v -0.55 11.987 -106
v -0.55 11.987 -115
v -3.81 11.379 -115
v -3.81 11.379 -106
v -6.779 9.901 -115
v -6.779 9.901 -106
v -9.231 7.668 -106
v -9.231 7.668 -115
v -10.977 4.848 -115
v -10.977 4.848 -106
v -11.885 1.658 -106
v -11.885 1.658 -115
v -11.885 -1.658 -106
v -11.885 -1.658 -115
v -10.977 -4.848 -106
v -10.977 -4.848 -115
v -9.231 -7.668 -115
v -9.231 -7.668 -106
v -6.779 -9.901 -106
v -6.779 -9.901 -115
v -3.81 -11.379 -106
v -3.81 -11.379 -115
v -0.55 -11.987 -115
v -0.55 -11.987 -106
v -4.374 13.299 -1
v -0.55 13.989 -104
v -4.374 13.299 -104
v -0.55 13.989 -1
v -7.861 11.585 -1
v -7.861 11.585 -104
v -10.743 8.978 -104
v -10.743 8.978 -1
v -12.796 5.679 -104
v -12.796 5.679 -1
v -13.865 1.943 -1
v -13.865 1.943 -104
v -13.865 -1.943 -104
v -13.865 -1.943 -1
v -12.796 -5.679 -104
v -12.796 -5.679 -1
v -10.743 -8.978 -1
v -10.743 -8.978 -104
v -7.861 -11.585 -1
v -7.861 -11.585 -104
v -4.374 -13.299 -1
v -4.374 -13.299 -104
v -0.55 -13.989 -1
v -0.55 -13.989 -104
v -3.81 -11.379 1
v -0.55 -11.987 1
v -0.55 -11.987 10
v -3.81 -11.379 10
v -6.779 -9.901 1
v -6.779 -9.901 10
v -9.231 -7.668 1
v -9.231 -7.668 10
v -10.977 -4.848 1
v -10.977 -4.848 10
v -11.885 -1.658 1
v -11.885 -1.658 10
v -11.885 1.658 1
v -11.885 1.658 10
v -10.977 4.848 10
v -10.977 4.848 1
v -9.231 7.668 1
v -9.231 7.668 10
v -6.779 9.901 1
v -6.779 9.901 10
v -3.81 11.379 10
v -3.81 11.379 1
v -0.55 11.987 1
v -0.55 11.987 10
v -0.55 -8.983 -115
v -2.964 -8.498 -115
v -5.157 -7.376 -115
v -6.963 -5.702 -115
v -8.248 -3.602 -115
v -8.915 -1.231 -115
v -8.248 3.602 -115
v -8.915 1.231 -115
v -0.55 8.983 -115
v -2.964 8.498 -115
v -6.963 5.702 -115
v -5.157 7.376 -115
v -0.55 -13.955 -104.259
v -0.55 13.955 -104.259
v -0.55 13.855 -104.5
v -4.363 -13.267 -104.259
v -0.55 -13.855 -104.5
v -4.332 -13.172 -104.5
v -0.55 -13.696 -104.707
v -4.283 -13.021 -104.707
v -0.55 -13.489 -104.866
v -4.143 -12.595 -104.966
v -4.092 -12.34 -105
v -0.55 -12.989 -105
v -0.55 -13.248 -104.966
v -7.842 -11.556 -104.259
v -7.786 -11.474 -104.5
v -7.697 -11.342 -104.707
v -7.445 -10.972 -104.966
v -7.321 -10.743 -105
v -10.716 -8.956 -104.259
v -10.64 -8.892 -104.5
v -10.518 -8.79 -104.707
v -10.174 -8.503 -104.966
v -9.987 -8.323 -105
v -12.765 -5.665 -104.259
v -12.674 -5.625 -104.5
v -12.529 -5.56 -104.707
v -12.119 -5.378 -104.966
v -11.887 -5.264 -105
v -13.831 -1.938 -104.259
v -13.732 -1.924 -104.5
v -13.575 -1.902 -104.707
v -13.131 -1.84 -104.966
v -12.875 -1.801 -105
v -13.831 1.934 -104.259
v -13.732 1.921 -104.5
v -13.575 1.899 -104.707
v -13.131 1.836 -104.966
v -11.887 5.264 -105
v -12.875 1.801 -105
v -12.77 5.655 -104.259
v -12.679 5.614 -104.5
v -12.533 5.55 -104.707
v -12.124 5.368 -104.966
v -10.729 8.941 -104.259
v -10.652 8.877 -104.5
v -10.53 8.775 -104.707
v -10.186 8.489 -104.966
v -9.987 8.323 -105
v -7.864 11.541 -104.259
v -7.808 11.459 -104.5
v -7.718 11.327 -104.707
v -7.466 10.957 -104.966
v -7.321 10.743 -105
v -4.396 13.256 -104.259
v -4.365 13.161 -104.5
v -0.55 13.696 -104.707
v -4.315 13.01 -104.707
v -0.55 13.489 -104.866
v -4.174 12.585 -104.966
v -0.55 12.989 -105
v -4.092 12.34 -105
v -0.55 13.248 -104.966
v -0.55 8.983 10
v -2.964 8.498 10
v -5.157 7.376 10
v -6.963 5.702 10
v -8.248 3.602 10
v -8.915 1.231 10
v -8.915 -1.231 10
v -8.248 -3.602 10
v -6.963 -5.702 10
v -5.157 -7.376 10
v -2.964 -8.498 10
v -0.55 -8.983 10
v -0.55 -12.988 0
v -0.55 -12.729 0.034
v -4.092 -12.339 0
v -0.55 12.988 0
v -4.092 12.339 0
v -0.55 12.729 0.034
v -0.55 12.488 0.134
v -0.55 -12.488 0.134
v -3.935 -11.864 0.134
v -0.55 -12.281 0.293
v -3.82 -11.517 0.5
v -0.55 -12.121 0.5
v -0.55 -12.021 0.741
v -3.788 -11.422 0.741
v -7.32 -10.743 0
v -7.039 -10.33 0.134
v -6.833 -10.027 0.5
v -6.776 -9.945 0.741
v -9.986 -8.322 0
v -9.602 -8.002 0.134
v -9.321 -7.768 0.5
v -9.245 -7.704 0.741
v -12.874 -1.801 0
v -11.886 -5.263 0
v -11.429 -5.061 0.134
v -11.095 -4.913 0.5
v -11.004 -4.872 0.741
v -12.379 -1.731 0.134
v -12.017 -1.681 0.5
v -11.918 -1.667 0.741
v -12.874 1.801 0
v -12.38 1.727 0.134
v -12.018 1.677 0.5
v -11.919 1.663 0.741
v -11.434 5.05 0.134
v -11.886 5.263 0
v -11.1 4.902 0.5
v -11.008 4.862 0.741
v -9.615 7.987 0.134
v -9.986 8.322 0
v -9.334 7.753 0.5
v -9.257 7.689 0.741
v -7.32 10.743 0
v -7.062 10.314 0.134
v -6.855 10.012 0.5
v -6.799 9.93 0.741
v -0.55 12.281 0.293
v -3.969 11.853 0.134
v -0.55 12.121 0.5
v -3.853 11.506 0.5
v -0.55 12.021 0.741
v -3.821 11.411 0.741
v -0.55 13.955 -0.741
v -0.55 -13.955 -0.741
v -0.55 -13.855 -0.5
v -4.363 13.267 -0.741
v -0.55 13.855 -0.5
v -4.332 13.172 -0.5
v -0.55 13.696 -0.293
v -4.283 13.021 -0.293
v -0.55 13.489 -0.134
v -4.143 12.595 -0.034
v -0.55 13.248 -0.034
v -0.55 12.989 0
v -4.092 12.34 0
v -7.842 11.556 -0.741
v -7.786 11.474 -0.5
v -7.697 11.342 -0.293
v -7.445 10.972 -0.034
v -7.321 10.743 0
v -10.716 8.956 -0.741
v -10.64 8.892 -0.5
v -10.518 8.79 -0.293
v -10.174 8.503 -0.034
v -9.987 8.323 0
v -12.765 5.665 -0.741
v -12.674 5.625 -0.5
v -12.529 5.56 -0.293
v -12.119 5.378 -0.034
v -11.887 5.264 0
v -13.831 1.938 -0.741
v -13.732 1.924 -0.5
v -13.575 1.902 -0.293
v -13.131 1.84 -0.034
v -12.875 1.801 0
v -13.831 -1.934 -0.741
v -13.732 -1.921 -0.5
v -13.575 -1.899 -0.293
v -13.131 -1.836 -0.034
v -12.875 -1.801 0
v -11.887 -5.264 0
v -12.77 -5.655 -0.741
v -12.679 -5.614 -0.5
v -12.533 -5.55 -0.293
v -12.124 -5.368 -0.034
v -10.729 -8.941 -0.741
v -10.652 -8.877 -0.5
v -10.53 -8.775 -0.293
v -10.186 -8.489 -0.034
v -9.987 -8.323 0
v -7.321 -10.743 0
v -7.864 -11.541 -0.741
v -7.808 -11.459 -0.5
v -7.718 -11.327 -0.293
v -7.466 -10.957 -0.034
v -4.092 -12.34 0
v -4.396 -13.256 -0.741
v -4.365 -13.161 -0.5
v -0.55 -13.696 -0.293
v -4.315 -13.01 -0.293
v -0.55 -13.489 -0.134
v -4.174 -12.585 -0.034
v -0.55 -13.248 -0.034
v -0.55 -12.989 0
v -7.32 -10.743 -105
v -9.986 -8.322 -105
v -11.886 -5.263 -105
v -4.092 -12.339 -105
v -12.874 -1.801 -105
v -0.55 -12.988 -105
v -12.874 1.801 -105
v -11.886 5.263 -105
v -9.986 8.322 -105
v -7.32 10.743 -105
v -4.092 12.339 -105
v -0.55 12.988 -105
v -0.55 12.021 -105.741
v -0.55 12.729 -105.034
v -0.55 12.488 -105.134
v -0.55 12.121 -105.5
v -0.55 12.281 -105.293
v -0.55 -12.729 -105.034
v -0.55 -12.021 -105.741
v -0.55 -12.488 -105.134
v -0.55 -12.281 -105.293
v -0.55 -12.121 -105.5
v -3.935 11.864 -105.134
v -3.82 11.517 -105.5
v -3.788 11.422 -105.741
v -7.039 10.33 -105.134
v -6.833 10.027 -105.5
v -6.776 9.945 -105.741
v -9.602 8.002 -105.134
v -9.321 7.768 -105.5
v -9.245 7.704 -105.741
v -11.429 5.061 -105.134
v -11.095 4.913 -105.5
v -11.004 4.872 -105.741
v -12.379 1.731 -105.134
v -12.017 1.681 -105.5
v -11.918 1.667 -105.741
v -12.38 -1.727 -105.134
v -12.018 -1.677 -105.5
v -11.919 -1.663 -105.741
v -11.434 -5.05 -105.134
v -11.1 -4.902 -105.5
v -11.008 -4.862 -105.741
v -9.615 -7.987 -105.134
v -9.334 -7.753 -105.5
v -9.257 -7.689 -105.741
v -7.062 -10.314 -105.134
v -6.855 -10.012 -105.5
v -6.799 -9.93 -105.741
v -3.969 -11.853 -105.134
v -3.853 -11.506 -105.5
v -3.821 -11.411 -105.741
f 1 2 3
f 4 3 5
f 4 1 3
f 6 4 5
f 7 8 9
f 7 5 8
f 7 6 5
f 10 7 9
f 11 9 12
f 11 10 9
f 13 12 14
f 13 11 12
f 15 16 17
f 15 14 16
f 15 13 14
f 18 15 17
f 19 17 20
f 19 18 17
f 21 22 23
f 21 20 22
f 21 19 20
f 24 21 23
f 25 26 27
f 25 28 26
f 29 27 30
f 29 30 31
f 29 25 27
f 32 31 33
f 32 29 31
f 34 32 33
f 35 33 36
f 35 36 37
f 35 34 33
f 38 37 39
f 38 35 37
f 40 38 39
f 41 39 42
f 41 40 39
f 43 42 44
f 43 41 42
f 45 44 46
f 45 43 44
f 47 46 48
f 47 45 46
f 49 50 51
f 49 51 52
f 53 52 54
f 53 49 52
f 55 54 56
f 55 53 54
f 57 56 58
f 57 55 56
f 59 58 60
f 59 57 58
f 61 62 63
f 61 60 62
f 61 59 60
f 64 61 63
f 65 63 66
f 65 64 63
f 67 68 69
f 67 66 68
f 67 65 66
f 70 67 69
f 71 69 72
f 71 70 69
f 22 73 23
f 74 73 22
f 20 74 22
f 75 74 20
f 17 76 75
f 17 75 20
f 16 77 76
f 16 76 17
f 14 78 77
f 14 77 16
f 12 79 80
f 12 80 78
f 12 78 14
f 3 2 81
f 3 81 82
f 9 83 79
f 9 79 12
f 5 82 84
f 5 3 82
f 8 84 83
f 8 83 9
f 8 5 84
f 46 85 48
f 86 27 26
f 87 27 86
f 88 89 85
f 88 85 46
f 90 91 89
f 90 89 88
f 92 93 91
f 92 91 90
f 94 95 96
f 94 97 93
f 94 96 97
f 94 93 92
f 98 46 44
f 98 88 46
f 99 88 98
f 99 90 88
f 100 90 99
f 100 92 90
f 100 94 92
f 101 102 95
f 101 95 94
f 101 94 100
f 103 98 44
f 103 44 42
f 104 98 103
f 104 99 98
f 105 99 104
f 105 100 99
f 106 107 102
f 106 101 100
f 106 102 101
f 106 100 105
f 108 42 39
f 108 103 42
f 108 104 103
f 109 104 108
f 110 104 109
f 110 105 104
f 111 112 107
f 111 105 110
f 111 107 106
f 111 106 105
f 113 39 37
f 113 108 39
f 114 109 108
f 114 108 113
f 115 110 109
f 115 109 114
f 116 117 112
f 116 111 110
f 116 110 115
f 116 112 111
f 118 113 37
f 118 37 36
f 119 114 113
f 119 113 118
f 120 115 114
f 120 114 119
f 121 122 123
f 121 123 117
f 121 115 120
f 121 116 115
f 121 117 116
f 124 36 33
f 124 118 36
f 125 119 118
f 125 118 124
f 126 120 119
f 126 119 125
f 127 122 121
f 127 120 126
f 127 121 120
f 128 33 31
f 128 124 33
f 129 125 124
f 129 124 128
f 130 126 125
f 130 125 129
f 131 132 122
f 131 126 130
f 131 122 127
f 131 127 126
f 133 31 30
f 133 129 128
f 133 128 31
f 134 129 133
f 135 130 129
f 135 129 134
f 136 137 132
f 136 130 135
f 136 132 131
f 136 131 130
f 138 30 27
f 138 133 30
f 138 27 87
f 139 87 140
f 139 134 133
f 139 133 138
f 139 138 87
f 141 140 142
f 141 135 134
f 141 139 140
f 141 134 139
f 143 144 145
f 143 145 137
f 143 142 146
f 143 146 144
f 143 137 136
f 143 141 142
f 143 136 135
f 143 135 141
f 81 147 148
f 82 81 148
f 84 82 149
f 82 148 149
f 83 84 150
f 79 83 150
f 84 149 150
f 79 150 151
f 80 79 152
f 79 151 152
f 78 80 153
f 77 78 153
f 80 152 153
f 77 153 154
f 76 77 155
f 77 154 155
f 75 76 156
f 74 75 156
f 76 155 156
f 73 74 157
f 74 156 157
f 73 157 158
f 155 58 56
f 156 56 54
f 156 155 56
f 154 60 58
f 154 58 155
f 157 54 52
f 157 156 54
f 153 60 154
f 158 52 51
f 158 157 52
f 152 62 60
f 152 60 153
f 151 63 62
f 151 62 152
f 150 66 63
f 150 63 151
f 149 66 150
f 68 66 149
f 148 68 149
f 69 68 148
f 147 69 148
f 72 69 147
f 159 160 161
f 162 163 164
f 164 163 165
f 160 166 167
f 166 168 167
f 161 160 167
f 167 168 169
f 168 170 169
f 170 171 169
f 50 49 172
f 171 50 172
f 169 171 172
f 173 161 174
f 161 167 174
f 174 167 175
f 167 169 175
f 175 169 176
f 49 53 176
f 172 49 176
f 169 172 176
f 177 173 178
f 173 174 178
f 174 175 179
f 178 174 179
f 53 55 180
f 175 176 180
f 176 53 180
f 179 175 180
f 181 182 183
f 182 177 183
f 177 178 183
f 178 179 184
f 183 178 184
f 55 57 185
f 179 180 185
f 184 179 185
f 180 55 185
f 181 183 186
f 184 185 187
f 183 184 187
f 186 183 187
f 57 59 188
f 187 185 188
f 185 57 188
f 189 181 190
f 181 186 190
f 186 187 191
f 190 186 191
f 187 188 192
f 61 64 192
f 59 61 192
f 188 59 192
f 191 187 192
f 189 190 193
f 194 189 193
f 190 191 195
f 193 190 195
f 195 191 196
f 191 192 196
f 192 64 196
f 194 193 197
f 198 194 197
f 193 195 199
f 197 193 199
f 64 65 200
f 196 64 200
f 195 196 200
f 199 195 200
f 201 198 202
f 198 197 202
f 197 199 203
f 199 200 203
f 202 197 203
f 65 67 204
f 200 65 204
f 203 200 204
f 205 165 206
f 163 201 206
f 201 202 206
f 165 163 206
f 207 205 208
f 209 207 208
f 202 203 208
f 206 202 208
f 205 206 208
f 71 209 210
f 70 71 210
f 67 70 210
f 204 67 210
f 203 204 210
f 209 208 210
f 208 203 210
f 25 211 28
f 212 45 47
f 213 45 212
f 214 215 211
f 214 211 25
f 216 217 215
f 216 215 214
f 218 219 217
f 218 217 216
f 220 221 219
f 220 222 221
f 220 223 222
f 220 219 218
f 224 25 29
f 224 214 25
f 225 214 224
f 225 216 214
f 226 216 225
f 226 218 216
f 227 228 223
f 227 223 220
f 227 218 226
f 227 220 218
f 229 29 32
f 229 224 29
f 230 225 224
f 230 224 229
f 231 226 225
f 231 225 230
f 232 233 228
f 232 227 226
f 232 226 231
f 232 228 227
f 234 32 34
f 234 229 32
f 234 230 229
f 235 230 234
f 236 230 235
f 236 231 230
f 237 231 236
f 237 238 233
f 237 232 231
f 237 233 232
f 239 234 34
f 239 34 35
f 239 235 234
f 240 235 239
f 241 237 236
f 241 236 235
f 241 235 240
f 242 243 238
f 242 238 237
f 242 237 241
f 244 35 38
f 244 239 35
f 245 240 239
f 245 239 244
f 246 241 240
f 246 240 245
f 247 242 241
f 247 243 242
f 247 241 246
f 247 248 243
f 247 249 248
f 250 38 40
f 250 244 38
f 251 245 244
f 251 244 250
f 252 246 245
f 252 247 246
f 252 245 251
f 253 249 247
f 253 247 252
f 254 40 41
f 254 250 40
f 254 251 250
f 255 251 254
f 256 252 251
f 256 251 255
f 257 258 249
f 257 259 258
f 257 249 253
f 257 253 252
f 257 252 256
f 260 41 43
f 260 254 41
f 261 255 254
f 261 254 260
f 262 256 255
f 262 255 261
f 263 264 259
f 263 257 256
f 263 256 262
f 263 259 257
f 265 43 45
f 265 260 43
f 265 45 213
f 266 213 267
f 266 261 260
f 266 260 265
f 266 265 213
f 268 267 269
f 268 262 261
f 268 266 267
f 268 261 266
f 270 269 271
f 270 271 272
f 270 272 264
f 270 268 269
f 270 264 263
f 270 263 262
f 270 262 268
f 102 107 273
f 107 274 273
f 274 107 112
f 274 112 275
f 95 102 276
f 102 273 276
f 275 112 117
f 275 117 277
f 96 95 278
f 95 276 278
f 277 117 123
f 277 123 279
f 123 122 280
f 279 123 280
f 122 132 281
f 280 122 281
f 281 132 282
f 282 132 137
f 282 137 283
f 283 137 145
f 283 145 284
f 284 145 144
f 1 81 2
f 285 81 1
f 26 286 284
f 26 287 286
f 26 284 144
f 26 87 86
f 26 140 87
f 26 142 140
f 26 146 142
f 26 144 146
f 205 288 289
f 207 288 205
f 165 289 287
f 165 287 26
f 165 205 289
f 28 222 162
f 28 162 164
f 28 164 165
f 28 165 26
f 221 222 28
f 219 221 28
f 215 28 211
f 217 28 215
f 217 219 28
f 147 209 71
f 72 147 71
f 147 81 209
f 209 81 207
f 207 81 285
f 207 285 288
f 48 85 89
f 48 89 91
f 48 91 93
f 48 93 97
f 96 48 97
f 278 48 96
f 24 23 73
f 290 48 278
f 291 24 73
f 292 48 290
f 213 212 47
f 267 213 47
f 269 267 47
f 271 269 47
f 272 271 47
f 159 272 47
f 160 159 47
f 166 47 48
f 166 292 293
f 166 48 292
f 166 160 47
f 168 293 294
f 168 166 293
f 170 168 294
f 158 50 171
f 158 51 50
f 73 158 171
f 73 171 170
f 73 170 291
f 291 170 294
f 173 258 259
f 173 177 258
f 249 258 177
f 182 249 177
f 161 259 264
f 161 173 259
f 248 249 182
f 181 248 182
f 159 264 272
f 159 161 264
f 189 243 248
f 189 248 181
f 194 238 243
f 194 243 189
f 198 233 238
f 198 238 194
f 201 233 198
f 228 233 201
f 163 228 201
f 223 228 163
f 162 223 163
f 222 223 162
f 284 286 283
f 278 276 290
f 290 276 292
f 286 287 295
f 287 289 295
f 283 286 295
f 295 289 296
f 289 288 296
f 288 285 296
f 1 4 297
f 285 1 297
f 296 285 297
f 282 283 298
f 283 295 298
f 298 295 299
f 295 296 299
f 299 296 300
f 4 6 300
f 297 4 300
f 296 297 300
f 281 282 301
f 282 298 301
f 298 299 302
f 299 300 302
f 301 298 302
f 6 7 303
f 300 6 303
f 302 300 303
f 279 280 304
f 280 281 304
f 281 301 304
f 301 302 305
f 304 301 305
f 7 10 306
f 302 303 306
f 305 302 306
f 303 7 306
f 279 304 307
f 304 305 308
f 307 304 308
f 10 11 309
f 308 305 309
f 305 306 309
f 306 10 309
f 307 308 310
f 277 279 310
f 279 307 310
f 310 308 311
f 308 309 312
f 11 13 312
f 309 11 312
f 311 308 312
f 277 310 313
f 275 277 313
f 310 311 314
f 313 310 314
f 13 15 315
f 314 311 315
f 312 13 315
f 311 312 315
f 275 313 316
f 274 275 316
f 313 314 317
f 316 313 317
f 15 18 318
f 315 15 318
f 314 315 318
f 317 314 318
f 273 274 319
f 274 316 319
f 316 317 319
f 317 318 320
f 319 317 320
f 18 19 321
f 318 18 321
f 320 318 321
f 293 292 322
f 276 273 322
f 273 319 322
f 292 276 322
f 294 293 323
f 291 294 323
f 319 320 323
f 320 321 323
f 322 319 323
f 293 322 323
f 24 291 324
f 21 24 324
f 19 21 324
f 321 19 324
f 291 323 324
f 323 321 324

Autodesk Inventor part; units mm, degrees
ref_plane "YZ Plane" through (0, 0, 0) normal (1, 0, 0) x (0, 1, 0)
ref_plane "XZ Plane" through (0, 0, 0) normal (0, 1, 0) x (-1, 0, 0)
ref_plane "XY Plane" through (0, 0, 0) normal (0, 0, 1) x (1, 0, 0)
sketch "Sketch1" plane through (0, 0, 0) normal (0, 0, 1) x (1, 0, 0)
  circle A0 centre (0, 0) radius 14
  dimension "d0" = 28
extrude "Extrusion1" add sketch "Sketch1" against normal blind 105
sketch "Sketch2" plane through (0, 0, 0) normal (0, 0, 1) x (1, 0, 0)
  circle A0 centre (0, 0) radius 14 projected
  circle A1 centre (0, 0) radius 12
  dimension "d3" = 2
extrude "Extrusion2" add sketch "Sketch2" along normal blind 10 contours A1
sketch "Sketch3" plane through (0, 0, -105) normal (0, 0, -1) x (-1, 0, 0)
  circle A0 centre (0, 0) radius 12 projected
extrude "Extrusion3" add sketch "Sketch3" along normal blind 10
fillet "Fillet1" radius 1 4 edges at (-12, 0, 0) (-14, 0, 0) (-14, 0, -105) (12, 0, -105)
sketch "Sketch4" plane through (0, 0, 10) normal (0, 0, 1) x (1, 0, 0)
  circle A0 centre (0, 0) radius 12 projected
  circle A1 centre (0, 0) radius 9
  dimension "d9" = 3
extrude "Extrusion4" cut sketch "Sketch4" against normal through all contours A1
sketch "Sketch5" plane through (0, 0, 10) normal (0, 0, 1) x (1, 0, 0)
  line L0 (0, -18.4925) -> (0, 18.8644)
  line L1 (-0.55, -18.4925) -> (-0.55, 18.8644)
  line L2 (-0.55, -18.4925) -> (-0.55, -24.6298)
  line L3 (-0.55, -24.6298) -> (18.7736, -14.0631)
  line L4 (18.7736, -14.0631) -> (17.813, 9.6853)
  line L5 (17.813, 9.6853) -> (0, 24.9482)
  line L6 (0, 24.9482) -> (-0.55, 18.8644)
  point P0 (0, 0)
  dimension "d12" = 0.55
extrude "Extrusion5" cut sketch "Sketch5" against normal through all
properties part number "handle"
